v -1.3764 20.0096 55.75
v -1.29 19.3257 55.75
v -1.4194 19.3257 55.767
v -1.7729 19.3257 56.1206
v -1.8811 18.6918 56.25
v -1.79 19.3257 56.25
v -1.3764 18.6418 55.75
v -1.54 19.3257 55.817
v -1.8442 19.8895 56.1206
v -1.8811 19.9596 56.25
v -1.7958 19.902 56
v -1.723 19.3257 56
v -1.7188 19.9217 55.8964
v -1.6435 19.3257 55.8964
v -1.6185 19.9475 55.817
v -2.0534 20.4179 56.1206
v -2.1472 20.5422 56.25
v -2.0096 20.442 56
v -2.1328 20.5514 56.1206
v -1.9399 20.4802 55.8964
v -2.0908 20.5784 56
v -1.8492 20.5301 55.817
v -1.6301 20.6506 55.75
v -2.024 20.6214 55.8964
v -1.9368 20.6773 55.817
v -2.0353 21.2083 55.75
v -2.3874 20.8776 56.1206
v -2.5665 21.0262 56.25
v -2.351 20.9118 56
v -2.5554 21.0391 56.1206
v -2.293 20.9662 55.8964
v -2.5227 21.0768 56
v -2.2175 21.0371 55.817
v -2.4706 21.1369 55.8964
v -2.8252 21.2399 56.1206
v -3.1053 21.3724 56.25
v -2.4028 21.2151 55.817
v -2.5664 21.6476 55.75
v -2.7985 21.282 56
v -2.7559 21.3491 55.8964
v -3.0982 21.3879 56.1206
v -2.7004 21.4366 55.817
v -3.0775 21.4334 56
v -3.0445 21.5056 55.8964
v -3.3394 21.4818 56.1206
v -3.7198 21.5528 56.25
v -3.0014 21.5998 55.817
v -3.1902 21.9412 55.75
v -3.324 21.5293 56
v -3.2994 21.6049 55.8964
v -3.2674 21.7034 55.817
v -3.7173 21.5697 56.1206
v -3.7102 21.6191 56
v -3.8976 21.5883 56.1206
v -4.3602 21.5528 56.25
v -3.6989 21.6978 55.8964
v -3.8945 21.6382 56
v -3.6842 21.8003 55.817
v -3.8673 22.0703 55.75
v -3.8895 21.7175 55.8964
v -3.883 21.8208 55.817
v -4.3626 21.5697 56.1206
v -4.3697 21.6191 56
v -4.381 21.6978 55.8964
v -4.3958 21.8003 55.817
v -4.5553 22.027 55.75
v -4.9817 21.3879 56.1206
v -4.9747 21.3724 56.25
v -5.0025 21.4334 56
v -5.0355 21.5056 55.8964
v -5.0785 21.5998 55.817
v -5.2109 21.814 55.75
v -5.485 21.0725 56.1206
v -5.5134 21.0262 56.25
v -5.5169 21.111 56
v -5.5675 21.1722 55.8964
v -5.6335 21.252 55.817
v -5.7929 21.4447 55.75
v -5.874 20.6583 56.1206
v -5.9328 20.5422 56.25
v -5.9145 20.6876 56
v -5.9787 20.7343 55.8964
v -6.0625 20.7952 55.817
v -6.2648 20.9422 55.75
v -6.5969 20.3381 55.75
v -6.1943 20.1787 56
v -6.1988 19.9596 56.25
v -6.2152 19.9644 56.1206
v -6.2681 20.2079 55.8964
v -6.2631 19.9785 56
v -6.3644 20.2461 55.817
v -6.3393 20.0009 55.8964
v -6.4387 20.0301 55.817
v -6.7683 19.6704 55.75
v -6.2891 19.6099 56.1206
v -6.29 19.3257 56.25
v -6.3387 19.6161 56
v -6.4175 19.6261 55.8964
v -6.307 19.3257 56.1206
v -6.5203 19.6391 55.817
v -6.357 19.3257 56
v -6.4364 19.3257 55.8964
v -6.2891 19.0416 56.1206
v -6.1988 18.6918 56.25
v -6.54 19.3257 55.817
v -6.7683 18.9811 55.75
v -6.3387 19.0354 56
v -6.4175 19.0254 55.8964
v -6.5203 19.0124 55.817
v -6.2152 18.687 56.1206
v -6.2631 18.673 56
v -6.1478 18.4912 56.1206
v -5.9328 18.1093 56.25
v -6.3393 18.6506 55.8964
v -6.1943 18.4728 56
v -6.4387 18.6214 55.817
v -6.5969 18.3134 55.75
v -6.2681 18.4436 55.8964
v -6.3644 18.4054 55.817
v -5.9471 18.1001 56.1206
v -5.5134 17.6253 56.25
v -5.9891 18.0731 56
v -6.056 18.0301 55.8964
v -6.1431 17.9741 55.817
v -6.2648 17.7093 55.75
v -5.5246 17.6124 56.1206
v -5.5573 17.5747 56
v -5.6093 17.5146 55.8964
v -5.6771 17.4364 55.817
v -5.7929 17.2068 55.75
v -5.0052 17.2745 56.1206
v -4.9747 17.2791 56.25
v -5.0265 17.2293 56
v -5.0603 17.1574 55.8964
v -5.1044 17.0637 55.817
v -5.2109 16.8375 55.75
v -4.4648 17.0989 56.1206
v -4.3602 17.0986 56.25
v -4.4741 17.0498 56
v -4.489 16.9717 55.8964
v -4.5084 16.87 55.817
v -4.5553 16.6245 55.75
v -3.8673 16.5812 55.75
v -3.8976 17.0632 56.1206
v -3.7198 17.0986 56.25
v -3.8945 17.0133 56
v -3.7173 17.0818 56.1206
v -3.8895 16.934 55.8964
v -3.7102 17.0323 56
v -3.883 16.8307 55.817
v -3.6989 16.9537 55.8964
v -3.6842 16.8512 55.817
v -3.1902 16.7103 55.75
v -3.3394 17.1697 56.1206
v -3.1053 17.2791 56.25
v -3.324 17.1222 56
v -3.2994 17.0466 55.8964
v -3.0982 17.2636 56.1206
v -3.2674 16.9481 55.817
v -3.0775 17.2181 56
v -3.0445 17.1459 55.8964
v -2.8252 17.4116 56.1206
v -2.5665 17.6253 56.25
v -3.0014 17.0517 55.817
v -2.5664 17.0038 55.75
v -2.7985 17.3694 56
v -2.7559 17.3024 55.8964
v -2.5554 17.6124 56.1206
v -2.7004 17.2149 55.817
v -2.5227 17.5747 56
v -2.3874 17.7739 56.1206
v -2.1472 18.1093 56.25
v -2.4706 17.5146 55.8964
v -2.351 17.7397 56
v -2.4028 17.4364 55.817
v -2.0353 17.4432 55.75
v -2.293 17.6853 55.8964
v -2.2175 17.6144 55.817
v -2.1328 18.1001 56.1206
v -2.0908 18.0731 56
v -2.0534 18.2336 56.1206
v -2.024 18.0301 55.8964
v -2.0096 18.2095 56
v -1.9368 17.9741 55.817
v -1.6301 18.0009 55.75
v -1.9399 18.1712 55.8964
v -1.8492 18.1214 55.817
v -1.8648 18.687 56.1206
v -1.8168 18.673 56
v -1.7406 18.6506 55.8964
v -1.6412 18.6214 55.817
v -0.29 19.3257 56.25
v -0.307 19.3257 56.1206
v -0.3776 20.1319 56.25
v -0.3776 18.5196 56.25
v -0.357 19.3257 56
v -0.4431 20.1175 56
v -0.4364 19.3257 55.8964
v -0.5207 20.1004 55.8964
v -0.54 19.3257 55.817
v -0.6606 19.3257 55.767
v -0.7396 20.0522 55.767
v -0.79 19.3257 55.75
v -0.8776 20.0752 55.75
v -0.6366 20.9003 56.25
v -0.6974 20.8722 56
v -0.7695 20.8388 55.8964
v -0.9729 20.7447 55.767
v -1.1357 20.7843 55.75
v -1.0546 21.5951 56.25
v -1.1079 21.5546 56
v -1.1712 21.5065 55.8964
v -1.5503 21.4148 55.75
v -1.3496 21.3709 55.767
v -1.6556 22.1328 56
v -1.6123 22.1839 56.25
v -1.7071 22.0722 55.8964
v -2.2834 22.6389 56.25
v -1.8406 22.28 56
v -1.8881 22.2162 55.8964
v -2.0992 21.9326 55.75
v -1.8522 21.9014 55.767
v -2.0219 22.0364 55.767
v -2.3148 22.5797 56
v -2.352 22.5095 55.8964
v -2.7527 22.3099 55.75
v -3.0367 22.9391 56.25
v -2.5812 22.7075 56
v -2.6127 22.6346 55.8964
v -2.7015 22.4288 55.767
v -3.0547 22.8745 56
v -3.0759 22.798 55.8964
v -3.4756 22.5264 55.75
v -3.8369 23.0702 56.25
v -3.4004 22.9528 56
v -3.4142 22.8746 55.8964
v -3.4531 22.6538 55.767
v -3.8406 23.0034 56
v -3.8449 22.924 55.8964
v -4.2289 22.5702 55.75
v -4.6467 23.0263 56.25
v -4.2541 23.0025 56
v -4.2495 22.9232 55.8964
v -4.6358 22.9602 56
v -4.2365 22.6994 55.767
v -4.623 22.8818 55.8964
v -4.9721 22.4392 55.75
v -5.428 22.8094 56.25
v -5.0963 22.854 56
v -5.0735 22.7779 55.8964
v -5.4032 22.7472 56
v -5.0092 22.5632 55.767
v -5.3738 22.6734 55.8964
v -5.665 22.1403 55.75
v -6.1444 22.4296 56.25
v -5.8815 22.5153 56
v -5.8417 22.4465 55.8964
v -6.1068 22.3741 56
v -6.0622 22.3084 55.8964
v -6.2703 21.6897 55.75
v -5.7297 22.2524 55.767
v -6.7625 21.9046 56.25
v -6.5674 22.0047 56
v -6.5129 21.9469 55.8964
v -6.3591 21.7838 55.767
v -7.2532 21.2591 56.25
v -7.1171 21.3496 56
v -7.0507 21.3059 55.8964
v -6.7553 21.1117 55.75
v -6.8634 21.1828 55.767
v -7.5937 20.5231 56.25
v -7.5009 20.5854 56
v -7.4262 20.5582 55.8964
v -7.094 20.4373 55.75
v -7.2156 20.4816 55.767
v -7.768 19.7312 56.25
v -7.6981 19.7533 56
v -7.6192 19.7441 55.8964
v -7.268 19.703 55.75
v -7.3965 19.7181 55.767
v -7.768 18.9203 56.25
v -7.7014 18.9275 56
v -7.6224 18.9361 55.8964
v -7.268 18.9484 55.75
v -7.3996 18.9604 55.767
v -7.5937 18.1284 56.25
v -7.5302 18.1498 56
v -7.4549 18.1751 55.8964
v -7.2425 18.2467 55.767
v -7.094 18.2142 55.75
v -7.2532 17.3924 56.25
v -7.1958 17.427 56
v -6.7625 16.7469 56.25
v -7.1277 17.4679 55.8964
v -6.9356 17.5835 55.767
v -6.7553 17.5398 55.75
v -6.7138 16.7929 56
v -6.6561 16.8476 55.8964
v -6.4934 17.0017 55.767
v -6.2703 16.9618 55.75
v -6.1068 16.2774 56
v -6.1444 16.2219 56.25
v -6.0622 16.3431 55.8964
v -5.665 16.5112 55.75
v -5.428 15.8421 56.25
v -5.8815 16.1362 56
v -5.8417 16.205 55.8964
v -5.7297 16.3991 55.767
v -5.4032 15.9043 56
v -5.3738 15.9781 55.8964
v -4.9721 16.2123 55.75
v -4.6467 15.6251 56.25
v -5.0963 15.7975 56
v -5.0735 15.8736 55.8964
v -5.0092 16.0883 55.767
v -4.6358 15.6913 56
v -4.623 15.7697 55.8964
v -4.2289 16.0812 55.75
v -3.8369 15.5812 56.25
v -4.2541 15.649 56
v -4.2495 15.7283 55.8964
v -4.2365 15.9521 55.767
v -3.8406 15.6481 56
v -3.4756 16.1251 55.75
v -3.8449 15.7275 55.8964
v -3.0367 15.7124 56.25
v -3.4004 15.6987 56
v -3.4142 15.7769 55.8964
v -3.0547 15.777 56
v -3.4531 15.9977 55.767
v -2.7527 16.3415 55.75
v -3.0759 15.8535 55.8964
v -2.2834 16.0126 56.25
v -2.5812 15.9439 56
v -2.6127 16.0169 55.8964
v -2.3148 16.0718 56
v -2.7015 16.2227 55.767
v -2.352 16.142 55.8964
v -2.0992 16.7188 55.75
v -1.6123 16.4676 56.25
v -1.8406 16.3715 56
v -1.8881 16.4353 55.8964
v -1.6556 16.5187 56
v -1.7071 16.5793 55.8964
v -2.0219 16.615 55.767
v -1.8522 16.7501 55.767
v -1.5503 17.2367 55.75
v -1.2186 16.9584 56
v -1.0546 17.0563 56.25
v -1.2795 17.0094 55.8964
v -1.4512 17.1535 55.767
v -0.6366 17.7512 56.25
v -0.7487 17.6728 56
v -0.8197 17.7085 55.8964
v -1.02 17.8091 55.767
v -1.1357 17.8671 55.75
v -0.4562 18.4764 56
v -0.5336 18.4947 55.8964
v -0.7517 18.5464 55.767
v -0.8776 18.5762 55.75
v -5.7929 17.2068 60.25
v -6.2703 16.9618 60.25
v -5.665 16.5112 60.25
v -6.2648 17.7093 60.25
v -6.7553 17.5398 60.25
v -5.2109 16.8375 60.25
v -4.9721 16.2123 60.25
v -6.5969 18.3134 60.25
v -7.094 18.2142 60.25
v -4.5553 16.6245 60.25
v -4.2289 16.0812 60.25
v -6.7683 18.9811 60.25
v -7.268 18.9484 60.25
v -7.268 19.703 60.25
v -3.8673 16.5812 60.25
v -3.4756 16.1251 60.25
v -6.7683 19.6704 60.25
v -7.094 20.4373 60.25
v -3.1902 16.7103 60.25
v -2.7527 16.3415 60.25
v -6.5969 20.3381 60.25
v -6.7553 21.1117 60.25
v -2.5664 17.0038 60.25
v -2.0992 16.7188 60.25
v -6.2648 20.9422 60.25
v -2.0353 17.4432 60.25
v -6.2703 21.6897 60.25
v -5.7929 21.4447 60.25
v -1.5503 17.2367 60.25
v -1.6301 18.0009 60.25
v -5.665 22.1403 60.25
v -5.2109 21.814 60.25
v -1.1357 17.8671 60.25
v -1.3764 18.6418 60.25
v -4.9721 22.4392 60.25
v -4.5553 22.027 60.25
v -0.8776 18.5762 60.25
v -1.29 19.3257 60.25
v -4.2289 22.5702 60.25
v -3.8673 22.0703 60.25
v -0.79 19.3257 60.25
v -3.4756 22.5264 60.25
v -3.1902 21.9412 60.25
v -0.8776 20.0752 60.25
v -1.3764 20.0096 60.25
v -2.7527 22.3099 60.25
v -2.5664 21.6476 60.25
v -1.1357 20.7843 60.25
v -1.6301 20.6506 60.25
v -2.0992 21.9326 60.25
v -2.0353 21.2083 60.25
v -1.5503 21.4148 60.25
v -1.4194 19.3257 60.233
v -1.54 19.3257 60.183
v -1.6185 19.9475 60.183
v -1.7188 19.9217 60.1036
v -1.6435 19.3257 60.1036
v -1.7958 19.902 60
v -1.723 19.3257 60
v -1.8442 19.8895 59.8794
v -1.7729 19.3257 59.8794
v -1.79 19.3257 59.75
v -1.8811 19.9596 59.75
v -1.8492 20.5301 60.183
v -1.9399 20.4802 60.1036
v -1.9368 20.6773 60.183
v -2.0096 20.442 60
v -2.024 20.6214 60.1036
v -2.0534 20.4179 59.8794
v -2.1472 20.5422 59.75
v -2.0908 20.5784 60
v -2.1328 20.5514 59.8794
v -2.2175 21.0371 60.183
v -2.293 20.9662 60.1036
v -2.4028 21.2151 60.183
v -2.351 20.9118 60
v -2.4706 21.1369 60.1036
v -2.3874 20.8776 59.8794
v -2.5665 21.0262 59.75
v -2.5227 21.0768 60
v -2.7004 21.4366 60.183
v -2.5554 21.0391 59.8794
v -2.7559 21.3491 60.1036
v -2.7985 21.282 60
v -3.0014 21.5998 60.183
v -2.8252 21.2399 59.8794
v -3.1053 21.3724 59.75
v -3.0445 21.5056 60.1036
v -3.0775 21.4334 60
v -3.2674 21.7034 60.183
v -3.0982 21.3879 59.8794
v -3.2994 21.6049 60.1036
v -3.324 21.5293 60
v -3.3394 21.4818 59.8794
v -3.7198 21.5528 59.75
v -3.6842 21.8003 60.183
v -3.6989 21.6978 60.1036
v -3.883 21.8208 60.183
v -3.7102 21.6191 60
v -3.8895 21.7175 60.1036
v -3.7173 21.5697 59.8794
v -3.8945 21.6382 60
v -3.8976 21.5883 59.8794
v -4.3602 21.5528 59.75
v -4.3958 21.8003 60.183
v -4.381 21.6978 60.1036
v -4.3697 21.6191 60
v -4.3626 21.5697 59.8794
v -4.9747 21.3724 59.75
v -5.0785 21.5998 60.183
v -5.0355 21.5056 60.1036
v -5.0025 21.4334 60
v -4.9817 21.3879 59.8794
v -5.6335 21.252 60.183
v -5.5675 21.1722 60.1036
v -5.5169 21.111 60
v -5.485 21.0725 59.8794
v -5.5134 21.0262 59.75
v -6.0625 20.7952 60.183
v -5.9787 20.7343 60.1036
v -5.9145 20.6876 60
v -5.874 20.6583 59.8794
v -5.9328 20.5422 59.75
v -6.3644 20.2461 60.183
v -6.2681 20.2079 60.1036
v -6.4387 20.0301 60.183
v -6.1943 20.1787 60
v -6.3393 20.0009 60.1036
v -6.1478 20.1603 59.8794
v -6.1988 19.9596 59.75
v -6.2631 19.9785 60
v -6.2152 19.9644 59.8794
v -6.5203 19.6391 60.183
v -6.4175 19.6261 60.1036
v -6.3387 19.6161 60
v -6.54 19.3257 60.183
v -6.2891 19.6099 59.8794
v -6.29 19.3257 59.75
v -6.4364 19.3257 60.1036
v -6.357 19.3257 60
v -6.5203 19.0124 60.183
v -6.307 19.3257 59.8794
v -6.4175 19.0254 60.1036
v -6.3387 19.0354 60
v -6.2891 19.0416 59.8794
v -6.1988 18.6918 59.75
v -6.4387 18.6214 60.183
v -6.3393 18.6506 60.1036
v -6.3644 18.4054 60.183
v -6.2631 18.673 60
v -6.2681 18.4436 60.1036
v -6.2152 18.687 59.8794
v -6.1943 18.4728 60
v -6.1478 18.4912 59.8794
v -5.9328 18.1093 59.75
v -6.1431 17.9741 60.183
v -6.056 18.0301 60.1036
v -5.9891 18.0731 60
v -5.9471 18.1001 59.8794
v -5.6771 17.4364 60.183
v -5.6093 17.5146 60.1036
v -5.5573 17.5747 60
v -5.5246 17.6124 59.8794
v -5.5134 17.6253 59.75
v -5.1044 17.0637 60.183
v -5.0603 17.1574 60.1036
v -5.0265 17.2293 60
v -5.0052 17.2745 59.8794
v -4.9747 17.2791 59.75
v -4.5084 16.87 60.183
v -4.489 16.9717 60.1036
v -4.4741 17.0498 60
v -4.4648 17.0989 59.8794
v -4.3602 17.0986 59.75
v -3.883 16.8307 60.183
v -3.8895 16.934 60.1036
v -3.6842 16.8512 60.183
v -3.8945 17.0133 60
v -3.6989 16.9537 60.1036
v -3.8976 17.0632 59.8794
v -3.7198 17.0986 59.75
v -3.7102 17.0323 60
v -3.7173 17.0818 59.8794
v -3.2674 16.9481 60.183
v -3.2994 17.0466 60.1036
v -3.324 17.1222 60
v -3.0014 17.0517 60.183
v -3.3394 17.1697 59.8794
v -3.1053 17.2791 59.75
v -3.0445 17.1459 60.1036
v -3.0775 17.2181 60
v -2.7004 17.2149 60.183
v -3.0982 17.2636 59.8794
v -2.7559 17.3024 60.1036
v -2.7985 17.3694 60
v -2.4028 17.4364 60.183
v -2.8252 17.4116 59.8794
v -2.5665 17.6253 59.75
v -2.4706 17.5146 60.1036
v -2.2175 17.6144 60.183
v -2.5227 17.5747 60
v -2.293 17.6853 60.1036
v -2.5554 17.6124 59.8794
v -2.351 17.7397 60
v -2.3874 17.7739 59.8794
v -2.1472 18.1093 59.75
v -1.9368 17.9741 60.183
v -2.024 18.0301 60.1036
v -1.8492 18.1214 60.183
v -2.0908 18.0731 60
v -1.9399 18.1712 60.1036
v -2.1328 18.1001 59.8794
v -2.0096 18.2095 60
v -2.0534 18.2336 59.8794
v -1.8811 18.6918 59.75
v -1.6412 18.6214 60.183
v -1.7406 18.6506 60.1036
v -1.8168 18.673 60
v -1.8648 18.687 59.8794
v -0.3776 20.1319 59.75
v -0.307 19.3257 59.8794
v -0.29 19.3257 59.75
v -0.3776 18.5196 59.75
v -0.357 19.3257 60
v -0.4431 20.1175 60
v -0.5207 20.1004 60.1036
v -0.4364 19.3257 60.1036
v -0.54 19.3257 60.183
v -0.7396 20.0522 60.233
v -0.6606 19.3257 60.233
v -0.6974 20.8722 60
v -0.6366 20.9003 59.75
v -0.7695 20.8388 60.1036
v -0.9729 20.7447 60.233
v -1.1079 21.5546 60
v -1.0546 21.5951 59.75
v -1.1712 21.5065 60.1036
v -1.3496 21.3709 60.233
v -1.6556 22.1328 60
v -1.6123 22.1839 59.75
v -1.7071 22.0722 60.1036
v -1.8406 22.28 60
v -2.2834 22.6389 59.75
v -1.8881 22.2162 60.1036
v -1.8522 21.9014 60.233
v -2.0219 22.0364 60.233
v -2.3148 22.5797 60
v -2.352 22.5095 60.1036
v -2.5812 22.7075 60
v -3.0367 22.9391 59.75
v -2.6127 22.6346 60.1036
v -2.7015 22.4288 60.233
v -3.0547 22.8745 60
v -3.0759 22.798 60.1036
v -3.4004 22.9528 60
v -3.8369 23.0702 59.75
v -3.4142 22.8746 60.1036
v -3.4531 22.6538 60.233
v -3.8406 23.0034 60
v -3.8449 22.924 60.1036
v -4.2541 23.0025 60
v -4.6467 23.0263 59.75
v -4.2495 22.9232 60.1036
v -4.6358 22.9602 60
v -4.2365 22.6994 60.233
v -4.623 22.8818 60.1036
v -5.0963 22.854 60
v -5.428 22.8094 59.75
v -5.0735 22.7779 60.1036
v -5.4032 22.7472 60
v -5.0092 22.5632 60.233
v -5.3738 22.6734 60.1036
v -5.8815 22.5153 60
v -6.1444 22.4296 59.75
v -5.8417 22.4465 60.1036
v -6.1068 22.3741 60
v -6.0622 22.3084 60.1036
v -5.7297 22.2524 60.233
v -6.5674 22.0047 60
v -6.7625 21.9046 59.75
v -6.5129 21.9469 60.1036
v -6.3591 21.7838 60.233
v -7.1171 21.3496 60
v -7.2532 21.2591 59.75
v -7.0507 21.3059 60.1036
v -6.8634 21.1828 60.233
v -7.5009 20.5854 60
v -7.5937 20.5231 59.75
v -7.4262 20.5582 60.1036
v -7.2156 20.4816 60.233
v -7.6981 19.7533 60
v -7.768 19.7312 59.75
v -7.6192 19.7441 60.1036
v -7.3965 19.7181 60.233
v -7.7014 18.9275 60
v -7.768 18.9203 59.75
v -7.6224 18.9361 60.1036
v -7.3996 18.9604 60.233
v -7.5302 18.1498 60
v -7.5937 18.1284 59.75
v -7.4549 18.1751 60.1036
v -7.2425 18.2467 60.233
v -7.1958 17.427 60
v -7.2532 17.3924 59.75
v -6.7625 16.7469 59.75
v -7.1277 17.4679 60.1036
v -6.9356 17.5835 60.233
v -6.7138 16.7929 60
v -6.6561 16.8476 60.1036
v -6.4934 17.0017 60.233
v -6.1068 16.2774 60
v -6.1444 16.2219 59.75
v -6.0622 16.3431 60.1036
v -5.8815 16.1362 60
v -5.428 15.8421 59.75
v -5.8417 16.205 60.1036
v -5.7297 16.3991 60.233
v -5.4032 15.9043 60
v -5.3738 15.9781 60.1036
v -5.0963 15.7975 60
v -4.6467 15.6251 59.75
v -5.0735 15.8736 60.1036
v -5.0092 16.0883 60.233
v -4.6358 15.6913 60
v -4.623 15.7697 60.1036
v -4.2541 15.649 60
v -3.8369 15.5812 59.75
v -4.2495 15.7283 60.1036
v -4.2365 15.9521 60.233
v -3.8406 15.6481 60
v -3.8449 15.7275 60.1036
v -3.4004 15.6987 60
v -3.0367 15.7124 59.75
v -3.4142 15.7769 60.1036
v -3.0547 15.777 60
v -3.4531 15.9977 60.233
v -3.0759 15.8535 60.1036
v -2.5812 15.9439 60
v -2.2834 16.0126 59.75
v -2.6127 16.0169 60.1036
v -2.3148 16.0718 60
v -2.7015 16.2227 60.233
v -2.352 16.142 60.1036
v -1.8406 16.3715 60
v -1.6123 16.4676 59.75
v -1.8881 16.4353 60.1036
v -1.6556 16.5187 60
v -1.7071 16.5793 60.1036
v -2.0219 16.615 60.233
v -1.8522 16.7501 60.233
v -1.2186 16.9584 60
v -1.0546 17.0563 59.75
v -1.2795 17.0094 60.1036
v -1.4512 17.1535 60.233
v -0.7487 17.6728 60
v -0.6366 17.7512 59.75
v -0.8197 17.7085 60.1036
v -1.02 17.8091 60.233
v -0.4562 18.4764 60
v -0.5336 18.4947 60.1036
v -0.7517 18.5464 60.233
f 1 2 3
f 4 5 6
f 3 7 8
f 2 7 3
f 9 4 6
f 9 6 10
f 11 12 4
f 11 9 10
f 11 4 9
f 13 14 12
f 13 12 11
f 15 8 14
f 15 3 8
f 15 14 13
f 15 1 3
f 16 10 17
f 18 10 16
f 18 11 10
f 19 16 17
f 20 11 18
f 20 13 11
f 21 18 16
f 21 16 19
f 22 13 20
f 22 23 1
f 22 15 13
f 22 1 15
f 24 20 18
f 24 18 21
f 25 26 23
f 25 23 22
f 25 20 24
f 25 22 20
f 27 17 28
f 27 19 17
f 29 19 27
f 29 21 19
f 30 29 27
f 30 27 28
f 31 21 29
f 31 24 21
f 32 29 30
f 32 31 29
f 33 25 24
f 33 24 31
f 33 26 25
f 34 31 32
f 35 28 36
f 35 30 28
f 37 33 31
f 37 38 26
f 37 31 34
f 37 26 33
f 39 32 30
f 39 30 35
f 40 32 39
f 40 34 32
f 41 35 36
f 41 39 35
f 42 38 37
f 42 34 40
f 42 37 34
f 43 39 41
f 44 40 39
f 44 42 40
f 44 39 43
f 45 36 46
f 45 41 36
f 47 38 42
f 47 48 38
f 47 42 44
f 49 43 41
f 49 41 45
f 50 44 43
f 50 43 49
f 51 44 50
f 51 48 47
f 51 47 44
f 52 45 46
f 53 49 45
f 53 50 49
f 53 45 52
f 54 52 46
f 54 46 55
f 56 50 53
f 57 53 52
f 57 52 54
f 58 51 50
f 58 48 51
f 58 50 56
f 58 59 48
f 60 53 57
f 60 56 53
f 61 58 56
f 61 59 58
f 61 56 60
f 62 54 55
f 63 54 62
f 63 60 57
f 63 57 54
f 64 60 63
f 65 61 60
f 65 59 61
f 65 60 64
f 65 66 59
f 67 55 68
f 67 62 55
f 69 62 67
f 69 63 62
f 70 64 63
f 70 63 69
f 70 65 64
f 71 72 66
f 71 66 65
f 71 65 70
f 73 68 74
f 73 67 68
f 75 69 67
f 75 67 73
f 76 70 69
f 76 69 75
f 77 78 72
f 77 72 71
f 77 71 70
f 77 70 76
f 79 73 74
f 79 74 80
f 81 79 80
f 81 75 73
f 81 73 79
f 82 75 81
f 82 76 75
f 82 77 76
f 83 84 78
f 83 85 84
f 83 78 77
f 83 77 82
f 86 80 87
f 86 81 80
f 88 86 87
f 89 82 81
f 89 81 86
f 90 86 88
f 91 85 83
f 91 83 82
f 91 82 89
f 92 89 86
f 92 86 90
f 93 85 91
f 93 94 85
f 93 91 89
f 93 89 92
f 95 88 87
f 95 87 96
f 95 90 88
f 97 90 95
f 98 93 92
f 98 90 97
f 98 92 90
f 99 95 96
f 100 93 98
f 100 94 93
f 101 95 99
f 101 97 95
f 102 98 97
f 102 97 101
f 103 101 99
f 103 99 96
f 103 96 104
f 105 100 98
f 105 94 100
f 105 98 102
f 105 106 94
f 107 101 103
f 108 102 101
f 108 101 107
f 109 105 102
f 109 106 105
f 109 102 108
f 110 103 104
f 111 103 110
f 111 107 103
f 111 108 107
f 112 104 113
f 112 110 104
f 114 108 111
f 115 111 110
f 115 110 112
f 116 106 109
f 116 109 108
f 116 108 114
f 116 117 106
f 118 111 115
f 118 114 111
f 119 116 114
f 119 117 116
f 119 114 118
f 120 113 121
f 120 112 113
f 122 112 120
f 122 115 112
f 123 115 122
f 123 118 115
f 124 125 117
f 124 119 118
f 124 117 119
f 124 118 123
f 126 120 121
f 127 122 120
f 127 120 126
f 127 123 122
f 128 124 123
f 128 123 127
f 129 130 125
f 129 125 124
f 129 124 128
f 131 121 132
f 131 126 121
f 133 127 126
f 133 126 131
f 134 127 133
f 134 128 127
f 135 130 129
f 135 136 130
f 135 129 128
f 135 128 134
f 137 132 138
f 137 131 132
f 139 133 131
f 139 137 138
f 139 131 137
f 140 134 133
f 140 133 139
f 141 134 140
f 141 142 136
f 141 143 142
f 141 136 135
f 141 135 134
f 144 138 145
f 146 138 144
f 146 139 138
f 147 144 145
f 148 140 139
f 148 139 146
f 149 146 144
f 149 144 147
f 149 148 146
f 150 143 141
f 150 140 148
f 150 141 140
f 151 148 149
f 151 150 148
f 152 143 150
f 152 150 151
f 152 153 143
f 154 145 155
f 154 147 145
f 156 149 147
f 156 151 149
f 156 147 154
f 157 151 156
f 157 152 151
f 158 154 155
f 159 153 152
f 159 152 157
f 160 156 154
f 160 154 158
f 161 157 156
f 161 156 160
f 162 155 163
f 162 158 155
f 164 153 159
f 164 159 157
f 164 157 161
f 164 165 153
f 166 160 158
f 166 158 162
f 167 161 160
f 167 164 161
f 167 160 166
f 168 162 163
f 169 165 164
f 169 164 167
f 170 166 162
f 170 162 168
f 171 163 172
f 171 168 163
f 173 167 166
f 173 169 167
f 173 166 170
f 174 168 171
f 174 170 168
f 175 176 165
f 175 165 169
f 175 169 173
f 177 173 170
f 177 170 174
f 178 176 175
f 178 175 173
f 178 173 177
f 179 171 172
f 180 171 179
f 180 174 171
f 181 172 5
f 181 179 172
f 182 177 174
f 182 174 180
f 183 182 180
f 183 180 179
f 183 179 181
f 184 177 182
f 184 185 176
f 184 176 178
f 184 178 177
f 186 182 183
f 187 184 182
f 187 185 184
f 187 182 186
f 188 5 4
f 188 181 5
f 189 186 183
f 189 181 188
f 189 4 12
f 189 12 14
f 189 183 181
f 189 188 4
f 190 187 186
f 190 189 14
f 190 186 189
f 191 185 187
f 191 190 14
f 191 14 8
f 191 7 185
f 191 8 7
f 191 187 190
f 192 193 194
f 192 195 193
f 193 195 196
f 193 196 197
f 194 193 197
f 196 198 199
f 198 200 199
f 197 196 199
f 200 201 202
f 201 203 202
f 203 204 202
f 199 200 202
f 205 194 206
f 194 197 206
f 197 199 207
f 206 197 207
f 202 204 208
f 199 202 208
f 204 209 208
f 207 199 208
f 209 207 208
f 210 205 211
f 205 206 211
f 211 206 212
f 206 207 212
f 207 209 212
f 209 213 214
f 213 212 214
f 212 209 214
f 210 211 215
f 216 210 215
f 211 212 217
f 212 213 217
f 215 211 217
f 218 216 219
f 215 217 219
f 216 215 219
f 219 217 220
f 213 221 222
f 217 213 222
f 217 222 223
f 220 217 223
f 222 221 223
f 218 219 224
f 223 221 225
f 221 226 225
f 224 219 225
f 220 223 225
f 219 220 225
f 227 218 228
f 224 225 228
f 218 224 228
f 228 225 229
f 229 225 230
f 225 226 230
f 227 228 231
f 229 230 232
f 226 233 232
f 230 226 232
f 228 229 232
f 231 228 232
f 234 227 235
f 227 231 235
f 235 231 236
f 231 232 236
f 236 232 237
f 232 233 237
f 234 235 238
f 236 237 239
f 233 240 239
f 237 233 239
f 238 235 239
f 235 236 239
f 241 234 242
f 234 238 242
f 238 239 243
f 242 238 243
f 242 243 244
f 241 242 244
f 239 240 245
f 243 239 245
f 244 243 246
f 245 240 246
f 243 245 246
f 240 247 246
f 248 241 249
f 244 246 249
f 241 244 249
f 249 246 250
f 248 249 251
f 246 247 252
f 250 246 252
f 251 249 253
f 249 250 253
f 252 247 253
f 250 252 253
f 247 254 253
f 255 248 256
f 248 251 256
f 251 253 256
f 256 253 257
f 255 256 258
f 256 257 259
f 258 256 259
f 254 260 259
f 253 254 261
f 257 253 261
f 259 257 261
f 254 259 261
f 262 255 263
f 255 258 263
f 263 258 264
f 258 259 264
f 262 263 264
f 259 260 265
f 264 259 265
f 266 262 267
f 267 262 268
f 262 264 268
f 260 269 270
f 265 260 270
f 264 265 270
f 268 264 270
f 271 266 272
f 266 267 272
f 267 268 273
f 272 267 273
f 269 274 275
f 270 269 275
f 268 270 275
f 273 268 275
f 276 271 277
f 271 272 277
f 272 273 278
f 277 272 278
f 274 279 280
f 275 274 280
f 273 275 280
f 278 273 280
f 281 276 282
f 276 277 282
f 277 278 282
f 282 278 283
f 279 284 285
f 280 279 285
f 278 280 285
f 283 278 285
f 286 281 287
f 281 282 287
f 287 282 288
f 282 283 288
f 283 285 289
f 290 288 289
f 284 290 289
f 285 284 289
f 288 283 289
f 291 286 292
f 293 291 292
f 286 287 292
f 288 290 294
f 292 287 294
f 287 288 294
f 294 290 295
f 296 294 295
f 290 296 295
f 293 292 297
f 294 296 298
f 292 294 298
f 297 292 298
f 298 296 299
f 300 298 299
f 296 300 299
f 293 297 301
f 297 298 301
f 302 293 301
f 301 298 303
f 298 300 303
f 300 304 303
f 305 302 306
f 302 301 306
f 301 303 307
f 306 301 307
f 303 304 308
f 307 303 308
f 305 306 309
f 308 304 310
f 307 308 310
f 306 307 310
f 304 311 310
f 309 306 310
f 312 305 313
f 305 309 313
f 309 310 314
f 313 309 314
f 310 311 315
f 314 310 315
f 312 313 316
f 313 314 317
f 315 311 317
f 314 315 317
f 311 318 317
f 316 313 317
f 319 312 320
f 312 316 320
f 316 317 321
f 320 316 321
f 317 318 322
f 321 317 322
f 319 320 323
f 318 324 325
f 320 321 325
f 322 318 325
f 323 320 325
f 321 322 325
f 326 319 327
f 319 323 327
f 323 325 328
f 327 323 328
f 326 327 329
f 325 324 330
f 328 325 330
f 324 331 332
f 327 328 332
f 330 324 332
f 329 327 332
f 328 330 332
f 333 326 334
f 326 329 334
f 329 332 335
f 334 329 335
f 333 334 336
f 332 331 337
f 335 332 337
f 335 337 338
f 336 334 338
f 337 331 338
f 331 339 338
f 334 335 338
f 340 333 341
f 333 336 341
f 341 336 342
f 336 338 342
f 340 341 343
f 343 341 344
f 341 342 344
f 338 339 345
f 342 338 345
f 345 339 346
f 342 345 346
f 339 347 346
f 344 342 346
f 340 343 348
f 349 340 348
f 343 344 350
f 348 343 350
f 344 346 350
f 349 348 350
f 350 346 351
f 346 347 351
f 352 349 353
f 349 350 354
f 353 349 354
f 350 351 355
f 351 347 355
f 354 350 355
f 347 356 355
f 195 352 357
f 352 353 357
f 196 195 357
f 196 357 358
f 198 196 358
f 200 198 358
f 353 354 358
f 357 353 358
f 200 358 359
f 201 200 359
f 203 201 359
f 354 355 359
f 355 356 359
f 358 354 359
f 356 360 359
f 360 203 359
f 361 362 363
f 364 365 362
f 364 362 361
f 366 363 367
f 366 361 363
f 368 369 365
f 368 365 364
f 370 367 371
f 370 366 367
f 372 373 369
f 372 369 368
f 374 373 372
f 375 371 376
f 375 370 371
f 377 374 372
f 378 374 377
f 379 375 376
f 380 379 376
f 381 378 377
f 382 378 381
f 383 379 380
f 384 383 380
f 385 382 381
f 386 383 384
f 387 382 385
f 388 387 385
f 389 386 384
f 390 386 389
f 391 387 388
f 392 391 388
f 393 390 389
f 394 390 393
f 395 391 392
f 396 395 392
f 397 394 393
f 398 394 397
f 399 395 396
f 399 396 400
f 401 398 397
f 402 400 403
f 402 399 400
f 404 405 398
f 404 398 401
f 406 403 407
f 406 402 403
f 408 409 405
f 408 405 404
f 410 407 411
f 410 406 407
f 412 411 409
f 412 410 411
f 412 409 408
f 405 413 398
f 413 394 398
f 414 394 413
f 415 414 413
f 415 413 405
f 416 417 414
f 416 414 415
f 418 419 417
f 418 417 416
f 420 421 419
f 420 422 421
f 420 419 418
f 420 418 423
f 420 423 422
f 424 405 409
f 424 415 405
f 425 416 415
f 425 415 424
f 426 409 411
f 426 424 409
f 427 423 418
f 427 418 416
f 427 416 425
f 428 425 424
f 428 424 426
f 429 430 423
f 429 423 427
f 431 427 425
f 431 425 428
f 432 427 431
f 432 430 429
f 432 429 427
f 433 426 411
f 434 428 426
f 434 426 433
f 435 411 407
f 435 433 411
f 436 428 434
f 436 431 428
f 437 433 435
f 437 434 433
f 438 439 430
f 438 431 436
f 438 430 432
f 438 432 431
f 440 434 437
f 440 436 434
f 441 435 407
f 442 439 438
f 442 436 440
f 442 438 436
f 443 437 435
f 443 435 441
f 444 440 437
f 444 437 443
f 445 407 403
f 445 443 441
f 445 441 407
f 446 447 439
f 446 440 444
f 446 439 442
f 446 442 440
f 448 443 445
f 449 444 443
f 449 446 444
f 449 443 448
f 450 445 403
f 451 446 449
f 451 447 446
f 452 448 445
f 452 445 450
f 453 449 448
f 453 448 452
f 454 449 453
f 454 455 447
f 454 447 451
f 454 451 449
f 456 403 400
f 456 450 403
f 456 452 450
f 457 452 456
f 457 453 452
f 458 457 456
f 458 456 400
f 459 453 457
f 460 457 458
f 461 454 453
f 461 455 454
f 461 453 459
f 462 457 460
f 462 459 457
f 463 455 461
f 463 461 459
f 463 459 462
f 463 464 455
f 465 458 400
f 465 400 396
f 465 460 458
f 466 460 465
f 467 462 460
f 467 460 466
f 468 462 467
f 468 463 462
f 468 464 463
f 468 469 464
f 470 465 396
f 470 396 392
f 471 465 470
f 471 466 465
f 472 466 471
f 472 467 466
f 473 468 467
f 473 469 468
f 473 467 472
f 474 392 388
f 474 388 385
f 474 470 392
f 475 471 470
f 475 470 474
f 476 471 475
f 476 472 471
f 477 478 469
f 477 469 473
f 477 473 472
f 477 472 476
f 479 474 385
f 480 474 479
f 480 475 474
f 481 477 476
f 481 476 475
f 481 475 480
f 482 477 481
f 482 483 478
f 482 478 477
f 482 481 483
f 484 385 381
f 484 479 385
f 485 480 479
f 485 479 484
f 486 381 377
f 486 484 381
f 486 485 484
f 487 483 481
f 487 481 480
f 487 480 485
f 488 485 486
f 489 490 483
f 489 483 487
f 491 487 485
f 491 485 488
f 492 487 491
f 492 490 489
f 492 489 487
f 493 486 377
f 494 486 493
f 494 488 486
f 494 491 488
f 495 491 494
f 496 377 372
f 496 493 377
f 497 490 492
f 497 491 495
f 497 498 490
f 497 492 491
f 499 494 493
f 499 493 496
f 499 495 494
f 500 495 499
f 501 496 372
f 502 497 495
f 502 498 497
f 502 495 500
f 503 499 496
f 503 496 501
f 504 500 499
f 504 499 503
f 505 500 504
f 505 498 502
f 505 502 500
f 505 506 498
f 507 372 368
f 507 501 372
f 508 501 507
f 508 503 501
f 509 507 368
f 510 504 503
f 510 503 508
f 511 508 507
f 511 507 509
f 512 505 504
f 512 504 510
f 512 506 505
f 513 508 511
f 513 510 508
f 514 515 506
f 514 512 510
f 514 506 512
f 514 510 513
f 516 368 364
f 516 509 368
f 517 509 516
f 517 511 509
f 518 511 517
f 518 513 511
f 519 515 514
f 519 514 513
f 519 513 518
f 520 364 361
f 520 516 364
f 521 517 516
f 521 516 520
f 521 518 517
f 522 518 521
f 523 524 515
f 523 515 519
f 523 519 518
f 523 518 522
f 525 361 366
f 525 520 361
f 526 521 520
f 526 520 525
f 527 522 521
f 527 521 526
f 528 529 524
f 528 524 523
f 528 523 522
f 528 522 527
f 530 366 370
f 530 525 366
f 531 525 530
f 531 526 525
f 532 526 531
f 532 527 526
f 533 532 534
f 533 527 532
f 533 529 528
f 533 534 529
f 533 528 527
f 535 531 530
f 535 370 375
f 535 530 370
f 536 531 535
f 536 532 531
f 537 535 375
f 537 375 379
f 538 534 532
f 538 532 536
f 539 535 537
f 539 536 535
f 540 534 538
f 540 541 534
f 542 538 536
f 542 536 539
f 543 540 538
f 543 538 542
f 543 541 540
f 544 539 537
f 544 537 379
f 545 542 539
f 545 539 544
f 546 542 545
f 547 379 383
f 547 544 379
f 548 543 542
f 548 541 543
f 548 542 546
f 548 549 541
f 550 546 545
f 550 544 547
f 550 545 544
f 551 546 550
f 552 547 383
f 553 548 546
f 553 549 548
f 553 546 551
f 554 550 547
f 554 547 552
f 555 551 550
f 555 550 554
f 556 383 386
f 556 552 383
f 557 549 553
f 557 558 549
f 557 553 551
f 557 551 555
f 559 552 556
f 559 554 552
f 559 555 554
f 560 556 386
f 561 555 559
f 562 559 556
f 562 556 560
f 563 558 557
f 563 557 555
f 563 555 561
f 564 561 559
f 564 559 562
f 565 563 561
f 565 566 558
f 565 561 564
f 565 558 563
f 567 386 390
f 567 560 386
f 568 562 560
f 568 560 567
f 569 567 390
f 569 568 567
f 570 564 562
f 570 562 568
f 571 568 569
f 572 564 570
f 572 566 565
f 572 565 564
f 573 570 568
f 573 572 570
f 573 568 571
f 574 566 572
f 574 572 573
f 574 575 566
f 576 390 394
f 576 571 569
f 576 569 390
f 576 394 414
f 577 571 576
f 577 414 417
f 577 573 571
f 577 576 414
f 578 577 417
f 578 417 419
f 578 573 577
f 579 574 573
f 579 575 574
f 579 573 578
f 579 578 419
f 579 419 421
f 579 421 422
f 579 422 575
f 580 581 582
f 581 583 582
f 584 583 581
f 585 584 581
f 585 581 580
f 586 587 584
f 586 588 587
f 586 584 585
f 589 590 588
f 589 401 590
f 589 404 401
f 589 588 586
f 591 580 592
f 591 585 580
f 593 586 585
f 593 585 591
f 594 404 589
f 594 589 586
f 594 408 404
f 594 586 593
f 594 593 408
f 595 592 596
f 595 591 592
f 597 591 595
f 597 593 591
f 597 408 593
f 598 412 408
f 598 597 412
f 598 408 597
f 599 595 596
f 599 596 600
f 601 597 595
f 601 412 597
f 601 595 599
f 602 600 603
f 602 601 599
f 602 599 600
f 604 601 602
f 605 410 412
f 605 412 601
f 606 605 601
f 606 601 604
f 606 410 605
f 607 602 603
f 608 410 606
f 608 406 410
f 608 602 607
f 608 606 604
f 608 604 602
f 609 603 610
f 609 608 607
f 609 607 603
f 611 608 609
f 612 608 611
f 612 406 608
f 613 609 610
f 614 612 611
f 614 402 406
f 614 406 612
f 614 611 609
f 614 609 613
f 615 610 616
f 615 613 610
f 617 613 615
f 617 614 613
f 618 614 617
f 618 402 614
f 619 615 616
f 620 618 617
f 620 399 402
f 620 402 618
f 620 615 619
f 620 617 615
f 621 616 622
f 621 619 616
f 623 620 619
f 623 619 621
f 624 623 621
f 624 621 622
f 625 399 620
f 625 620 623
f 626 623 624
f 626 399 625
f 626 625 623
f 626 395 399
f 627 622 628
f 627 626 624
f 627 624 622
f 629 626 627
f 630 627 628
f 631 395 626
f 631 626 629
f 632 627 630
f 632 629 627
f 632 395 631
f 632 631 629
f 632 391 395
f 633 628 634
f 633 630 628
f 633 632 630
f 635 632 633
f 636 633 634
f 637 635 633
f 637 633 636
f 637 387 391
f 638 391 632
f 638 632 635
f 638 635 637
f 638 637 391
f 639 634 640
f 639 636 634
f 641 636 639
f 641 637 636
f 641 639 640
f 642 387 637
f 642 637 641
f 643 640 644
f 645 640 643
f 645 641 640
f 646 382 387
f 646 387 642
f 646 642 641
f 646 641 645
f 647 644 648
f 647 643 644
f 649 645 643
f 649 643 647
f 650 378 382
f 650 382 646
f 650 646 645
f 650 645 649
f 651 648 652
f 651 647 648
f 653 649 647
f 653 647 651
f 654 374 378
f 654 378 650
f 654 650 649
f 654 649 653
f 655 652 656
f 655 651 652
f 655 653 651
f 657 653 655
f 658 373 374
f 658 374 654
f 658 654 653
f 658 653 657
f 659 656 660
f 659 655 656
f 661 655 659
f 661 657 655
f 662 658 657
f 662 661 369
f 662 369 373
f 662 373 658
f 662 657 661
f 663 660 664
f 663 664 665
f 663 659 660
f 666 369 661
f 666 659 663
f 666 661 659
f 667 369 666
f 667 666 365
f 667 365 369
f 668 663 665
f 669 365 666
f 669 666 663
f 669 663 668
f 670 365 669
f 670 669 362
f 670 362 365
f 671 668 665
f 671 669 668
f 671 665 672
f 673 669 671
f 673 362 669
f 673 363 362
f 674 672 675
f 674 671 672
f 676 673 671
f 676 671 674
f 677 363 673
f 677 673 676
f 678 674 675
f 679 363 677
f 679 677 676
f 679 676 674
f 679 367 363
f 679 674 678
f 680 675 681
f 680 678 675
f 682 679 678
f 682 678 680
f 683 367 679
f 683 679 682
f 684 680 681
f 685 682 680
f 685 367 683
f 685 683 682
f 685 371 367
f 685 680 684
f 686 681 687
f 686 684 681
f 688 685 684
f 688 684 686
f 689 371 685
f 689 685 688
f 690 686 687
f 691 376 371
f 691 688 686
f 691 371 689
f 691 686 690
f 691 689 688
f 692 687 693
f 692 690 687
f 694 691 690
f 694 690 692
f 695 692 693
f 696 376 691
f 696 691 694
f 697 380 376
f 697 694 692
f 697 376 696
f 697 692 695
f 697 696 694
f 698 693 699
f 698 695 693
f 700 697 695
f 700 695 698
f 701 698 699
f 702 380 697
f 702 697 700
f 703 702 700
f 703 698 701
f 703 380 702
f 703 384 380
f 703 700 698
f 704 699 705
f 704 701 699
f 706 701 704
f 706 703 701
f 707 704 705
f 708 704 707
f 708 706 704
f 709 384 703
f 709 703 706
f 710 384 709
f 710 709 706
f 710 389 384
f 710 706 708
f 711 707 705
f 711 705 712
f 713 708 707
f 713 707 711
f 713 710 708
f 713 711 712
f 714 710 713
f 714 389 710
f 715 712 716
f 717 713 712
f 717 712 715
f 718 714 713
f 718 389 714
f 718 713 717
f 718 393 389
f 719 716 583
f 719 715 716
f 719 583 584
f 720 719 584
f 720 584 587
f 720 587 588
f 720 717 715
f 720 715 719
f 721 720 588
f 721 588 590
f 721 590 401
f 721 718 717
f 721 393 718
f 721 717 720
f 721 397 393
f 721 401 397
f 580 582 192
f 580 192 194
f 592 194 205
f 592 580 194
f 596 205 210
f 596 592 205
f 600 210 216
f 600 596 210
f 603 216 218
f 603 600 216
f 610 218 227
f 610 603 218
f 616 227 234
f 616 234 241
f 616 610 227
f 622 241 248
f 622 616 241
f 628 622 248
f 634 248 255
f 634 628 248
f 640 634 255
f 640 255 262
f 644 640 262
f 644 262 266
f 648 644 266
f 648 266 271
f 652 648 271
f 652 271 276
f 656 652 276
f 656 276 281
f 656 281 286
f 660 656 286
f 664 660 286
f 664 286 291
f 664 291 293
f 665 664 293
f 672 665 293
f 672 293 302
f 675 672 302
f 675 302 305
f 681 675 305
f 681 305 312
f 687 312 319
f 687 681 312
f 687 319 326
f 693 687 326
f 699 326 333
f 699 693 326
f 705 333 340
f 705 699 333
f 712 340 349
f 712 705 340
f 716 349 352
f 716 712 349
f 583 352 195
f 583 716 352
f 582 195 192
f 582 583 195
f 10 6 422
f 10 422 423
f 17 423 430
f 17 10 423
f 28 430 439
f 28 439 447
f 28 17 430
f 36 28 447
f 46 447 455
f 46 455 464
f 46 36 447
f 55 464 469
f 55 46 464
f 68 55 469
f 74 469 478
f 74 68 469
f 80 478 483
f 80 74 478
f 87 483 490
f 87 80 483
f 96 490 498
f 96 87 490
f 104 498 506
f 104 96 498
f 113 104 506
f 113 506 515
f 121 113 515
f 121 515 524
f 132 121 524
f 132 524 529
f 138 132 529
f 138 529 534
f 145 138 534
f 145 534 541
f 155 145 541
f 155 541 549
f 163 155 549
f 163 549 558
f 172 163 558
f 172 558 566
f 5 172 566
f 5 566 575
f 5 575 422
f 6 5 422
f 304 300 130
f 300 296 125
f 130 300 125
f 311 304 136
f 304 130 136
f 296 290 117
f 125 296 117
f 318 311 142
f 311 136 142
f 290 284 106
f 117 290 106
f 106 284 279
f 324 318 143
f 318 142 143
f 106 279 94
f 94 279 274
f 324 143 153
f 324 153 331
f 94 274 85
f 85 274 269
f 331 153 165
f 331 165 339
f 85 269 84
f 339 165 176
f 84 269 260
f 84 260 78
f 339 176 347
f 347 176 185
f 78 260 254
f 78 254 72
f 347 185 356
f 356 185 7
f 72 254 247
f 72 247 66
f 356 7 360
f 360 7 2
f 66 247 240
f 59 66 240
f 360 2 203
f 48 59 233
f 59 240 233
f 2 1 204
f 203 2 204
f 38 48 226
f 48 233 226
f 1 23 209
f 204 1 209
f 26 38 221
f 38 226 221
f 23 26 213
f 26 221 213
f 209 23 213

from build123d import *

# Parameters (mm, degrees)
SKETCH1_R           = 3.75
SKETCH1_R_2         = 2.25
BOSS_EXTRUDE2_DEPTH = 2.25
FILLET1_R           = 0.5


with BuildPart() as part:
    # Sketch1 → Boss-Extrude2 (new, symmetric)
    with BuildSketch(Plane.XY.offset(58)):
        with Locations((-4.039970845, 19.325746234)):
            Circle(SKETCH1_R)
        with Locations((-4.039970845, 19.325746234)):
            Circle(SKETCH1_R_2, mode=Mode.SUBTRACT)
    extrude(amount=BOSS_EXTRUDE2_DEPTH, both=True)

    # Fillet1
    fillet1_edges = [part.edges().sort_by_distance(p)[0] for p in [
        (-7.789970845, 19.325746234, 55.75),
        (-7.789970845, 19.325746234, 60.25),
        (-6.289970845, 19.325746234, 55.75),
        (-6.289970845, 19.325746234, 60.25),
    ]]
    fillet(fillet1_edges, radius=FILLET1_R)


solid = part.part
